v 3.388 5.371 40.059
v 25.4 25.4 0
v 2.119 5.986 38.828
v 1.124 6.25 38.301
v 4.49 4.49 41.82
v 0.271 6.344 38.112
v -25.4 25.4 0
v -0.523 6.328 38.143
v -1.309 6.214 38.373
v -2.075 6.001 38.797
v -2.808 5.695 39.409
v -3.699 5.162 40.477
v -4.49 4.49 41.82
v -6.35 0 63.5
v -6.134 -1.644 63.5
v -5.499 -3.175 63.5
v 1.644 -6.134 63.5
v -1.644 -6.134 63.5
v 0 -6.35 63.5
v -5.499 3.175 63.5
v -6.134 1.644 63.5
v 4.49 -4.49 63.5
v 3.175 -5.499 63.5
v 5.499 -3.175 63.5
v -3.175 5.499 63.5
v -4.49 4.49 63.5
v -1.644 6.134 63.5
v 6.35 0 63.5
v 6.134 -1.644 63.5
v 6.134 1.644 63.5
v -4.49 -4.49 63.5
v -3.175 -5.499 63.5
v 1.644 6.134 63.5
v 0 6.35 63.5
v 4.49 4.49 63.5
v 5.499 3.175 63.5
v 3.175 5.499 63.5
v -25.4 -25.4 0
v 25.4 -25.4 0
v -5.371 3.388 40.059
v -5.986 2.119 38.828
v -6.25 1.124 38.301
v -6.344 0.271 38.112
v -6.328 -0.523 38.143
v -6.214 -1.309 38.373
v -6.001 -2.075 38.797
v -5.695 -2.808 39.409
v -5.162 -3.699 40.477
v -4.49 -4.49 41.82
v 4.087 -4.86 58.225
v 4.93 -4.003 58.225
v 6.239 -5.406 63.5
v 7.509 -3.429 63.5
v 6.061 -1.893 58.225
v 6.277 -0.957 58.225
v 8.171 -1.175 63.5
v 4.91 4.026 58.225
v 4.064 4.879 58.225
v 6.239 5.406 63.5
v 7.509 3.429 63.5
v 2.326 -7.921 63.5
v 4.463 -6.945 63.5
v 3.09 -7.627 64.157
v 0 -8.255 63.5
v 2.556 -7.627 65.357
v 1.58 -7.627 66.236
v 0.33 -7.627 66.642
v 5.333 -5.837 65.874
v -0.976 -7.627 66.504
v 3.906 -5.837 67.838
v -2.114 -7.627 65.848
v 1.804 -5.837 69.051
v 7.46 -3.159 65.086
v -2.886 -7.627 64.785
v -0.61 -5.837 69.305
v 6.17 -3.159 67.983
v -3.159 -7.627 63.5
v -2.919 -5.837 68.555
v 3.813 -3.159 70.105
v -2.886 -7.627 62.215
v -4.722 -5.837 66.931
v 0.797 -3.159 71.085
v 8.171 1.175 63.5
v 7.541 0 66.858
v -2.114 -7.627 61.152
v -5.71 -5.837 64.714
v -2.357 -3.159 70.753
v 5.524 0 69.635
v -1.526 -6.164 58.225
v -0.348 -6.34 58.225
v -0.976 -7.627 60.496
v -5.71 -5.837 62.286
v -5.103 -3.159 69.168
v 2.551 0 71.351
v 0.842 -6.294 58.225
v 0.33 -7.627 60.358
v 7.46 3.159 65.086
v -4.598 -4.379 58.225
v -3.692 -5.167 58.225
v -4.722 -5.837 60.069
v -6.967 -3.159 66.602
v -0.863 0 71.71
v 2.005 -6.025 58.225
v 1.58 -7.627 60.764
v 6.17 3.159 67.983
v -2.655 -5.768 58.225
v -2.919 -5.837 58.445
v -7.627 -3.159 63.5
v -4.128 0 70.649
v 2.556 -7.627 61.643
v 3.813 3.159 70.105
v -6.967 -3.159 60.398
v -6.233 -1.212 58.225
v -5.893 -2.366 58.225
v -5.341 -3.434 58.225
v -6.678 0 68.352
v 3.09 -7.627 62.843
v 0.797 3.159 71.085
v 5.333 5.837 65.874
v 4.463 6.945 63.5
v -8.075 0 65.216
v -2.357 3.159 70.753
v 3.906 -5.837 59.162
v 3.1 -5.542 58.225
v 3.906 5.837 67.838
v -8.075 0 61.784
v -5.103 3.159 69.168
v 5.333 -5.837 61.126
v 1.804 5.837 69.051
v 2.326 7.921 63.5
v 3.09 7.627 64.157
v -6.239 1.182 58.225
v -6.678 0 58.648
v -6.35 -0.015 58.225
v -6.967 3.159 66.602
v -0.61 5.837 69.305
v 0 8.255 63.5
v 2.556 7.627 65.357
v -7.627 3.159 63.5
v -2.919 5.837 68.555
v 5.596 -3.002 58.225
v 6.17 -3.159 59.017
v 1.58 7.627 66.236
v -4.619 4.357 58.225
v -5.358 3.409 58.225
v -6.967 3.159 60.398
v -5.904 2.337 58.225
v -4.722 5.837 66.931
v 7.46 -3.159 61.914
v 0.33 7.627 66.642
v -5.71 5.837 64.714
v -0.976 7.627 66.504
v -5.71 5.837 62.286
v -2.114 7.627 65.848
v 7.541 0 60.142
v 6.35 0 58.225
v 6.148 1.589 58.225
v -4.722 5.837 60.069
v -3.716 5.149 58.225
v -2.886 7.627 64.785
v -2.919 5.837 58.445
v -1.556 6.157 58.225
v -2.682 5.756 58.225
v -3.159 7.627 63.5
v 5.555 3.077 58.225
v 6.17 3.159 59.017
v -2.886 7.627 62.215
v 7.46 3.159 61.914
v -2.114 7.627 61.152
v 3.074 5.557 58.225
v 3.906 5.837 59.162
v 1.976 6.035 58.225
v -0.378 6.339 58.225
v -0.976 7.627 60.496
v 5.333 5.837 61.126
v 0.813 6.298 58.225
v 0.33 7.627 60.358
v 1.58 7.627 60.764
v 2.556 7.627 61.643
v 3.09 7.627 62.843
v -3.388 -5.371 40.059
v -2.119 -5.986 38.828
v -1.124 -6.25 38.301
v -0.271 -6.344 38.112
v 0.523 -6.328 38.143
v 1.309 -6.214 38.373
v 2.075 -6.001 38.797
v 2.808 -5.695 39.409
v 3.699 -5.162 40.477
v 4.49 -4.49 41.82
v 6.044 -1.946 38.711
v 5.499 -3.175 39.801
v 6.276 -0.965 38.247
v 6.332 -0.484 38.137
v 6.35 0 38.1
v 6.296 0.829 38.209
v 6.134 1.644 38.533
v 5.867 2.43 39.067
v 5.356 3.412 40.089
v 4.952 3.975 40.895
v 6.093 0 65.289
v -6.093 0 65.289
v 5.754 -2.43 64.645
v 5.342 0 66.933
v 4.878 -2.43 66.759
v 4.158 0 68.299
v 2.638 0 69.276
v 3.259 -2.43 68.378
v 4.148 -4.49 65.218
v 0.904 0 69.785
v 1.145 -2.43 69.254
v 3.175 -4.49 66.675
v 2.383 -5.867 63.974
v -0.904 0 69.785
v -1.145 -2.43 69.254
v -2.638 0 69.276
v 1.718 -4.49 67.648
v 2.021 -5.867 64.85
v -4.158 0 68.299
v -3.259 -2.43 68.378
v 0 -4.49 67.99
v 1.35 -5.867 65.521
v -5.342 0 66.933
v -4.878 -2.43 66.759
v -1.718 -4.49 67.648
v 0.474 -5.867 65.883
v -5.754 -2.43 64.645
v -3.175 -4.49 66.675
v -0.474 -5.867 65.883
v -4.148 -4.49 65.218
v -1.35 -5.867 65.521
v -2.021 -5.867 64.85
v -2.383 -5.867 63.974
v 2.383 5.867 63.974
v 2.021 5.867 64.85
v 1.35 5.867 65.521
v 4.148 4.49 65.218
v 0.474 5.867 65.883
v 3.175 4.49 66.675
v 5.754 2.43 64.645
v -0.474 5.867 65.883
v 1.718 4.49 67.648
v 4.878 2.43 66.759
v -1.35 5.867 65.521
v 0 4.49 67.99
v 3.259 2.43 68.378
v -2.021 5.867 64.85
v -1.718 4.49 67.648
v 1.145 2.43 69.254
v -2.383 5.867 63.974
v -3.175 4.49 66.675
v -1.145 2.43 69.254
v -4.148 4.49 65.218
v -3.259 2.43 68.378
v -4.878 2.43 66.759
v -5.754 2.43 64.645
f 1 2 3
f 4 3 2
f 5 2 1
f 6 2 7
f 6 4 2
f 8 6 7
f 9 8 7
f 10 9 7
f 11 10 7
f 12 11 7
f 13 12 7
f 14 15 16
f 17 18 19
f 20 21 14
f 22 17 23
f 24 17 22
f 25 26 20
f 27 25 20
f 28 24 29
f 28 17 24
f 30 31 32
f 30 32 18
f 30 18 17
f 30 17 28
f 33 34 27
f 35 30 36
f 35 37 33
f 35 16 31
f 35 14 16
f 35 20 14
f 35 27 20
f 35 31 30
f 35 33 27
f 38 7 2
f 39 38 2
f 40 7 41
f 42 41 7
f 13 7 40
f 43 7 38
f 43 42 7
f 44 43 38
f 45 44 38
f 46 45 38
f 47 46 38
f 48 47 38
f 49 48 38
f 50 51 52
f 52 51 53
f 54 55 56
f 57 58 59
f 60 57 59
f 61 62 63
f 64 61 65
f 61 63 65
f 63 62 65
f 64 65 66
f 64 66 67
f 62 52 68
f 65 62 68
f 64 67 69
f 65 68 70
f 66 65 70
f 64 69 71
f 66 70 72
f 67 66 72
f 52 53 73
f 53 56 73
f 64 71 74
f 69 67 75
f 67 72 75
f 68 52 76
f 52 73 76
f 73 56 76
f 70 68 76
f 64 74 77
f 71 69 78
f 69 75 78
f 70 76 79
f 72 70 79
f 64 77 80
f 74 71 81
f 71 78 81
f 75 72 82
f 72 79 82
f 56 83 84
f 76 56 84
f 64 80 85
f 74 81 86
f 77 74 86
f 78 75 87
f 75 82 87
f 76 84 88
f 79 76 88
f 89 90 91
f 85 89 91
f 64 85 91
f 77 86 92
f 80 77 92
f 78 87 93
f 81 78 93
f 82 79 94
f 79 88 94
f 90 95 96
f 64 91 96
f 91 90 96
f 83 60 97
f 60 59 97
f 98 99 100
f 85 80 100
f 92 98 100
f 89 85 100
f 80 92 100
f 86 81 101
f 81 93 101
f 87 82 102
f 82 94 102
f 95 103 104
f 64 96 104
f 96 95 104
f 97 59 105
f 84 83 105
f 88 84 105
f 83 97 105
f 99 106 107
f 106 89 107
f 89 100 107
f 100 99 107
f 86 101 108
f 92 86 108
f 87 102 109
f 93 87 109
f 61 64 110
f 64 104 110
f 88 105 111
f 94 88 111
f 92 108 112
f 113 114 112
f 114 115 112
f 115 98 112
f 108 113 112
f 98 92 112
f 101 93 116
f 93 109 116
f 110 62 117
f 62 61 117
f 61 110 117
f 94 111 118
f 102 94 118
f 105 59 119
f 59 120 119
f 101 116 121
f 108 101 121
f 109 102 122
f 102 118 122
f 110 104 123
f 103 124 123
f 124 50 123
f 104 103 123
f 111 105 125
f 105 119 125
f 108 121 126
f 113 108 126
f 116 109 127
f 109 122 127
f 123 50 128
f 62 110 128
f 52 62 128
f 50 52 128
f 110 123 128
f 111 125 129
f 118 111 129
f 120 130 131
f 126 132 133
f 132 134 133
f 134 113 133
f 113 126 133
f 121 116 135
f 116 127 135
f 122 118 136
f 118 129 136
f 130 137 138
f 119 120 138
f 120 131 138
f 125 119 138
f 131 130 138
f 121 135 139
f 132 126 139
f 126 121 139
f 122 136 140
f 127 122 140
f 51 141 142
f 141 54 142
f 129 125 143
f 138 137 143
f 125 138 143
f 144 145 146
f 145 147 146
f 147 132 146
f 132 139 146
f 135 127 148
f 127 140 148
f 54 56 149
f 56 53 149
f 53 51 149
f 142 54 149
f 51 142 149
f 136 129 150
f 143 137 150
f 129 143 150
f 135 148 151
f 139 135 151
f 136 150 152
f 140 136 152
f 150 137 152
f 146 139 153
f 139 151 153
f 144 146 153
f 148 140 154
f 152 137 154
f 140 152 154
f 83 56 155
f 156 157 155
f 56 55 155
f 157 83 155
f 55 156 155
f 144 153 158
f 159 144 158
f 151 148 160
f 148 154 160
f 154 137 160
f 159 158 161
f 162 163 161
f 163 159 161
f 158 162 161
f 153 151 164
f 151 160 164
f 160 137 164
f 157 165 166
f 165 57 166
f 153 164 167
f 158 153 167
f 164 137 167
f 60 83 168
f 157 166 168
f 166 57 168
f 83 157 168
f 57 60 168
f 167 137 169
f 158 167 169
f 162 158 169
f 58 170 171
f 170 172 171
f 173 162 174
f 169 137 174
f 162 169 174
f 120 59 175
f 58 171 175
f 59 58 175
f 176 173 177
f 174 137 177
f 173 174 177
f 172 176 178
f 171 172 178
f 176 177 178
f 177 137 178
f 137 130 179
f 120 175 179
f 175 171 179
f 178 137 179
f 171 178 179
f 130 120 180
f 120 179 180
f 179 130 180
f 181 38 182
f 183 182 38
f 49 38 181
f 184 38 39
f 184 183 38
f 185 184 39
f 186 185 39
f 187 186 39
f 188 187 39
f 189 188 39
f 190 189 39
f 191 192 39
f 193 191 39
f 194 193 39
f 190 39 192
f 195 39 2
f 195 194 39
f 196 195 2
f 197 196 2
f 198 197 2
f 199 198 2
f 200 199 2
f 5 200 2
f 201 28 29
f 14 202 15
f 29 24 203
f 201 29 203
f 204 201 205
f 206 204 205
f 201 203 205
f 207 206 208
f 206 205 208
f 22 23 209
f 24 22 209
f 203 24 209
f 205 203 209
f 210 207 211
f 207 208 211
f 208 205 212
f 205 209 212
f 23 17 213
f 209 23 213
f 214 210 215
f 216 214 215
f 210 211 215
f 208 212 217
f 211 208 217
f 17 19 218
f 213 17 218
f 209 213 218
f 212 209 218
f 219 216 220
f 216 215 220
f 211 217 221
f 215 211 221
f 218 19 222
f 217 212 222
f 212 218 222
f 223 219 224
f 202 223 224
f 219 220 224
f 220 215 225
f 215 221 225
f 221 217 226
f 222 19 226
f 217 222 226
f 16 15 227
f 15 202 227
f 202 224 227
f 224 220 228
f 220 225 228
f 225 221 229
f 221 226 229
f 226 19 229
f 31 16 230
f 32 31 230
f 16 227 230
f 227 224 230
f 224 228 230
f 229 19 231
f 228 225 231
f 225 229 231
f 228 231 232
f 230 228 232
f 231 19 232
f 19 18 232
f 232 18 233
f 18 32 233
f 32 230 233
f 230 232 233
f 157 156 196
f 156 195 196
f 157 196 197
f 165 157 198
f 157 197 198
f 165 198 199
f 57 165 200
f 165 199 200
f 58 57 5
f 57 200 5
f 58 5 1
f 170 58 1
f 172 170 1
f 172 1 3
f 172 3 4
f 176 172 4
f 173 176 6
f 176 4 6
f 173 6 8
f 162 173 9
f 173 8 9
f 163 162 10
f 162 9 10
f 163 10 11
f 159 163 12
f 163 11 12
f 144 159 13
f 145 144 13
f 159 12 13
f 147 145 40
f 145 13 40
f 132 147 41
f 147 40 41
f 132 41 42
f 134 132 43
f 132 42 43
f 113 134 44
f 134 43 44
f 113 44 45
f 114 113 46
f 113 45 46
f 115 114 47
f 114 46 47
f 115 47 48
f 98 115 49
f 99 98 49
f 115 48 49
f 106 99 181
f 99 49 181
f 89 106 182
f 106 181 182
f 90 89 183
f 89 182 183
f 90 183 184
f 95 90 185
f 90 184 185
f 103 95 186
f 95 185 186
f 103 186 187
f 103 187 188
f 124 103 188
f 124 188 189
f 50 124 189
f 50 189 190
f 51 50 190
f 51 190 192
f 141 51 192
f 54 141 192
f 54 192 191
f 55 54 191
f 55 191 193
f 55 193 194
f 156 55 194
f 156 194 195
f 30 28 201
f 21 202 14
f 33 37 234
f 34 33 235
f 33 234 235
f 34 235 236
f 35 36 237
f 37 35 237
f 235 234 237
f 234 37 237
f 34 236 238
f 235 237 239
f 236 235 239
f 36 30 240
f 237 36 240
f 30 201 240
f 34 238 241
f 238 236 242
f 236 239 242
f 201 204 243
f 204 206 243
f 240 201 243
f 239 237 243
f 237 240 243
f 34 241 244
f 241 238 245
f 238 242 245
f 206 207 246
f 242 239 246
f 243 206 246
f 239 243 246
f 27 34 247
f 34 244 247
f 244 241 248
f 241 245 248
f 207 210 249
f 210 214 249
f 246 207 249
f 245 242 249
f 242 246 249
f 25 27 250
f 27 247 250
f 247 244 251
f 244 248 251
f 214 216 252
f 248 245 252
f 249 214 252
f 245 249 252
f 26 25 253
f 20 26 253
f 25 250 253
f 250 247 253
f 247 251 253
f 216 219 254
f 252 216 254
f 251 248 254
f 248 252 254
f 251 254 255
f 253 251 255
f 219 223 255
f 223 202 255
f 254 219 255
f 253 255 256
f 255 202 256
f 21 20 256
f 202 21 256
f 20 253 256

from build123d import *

# Parameters (mm, degrees)
F0_W          = 50.8
F0_H          = 50.8
F4_R          = 6.35
F5_DEPTH      = 25.4
F5_DEPTH_BACK = 12.7


with BuildPart() as f3:
    # F0 (on Top) → F3 section 0
    with BuildSketch(Plane.XY, mode=Mode.PRIVATE) as f3_s0:
        Rectangle(F0_W, F0_H)
    loft([f3_s0.sketch, Vertex(0, 0, 50.8)])

    # F4 (on offset) → F5 (join, two sides)
    with BuildSketch(Plane.XY.offset(50.8)) as f5_sk:
        Circle(F4_R)
    extrude(amount=-F5_DEPTH)
    extrude(f5_sk.sketch, amount=F5_DEPTH_BACK)

    # F6 (on face) → F7 (revolve)
    with BuildSketch(Plane.XY.offset(63.5)):
        with BuildLine():
            Line((0, -6.35), (0, -8.255))
            ThreePointArc((0, -8.255), (8.255, 0), (0, 8.255))
            Line((0, 8.255), (0, 6.35))
            ThreePointArc((0, 6.35), (4.4901280605, 4.4901280605), (6.35, 0))
            ThreePointArc((6.35, 0), (4.4901280605, -4.4901280605), (0, -6.35))
        make_face()
    revolve(axis=Axis((0, 0, 63.5), (0, -1, 0)))


solid = f3.part
